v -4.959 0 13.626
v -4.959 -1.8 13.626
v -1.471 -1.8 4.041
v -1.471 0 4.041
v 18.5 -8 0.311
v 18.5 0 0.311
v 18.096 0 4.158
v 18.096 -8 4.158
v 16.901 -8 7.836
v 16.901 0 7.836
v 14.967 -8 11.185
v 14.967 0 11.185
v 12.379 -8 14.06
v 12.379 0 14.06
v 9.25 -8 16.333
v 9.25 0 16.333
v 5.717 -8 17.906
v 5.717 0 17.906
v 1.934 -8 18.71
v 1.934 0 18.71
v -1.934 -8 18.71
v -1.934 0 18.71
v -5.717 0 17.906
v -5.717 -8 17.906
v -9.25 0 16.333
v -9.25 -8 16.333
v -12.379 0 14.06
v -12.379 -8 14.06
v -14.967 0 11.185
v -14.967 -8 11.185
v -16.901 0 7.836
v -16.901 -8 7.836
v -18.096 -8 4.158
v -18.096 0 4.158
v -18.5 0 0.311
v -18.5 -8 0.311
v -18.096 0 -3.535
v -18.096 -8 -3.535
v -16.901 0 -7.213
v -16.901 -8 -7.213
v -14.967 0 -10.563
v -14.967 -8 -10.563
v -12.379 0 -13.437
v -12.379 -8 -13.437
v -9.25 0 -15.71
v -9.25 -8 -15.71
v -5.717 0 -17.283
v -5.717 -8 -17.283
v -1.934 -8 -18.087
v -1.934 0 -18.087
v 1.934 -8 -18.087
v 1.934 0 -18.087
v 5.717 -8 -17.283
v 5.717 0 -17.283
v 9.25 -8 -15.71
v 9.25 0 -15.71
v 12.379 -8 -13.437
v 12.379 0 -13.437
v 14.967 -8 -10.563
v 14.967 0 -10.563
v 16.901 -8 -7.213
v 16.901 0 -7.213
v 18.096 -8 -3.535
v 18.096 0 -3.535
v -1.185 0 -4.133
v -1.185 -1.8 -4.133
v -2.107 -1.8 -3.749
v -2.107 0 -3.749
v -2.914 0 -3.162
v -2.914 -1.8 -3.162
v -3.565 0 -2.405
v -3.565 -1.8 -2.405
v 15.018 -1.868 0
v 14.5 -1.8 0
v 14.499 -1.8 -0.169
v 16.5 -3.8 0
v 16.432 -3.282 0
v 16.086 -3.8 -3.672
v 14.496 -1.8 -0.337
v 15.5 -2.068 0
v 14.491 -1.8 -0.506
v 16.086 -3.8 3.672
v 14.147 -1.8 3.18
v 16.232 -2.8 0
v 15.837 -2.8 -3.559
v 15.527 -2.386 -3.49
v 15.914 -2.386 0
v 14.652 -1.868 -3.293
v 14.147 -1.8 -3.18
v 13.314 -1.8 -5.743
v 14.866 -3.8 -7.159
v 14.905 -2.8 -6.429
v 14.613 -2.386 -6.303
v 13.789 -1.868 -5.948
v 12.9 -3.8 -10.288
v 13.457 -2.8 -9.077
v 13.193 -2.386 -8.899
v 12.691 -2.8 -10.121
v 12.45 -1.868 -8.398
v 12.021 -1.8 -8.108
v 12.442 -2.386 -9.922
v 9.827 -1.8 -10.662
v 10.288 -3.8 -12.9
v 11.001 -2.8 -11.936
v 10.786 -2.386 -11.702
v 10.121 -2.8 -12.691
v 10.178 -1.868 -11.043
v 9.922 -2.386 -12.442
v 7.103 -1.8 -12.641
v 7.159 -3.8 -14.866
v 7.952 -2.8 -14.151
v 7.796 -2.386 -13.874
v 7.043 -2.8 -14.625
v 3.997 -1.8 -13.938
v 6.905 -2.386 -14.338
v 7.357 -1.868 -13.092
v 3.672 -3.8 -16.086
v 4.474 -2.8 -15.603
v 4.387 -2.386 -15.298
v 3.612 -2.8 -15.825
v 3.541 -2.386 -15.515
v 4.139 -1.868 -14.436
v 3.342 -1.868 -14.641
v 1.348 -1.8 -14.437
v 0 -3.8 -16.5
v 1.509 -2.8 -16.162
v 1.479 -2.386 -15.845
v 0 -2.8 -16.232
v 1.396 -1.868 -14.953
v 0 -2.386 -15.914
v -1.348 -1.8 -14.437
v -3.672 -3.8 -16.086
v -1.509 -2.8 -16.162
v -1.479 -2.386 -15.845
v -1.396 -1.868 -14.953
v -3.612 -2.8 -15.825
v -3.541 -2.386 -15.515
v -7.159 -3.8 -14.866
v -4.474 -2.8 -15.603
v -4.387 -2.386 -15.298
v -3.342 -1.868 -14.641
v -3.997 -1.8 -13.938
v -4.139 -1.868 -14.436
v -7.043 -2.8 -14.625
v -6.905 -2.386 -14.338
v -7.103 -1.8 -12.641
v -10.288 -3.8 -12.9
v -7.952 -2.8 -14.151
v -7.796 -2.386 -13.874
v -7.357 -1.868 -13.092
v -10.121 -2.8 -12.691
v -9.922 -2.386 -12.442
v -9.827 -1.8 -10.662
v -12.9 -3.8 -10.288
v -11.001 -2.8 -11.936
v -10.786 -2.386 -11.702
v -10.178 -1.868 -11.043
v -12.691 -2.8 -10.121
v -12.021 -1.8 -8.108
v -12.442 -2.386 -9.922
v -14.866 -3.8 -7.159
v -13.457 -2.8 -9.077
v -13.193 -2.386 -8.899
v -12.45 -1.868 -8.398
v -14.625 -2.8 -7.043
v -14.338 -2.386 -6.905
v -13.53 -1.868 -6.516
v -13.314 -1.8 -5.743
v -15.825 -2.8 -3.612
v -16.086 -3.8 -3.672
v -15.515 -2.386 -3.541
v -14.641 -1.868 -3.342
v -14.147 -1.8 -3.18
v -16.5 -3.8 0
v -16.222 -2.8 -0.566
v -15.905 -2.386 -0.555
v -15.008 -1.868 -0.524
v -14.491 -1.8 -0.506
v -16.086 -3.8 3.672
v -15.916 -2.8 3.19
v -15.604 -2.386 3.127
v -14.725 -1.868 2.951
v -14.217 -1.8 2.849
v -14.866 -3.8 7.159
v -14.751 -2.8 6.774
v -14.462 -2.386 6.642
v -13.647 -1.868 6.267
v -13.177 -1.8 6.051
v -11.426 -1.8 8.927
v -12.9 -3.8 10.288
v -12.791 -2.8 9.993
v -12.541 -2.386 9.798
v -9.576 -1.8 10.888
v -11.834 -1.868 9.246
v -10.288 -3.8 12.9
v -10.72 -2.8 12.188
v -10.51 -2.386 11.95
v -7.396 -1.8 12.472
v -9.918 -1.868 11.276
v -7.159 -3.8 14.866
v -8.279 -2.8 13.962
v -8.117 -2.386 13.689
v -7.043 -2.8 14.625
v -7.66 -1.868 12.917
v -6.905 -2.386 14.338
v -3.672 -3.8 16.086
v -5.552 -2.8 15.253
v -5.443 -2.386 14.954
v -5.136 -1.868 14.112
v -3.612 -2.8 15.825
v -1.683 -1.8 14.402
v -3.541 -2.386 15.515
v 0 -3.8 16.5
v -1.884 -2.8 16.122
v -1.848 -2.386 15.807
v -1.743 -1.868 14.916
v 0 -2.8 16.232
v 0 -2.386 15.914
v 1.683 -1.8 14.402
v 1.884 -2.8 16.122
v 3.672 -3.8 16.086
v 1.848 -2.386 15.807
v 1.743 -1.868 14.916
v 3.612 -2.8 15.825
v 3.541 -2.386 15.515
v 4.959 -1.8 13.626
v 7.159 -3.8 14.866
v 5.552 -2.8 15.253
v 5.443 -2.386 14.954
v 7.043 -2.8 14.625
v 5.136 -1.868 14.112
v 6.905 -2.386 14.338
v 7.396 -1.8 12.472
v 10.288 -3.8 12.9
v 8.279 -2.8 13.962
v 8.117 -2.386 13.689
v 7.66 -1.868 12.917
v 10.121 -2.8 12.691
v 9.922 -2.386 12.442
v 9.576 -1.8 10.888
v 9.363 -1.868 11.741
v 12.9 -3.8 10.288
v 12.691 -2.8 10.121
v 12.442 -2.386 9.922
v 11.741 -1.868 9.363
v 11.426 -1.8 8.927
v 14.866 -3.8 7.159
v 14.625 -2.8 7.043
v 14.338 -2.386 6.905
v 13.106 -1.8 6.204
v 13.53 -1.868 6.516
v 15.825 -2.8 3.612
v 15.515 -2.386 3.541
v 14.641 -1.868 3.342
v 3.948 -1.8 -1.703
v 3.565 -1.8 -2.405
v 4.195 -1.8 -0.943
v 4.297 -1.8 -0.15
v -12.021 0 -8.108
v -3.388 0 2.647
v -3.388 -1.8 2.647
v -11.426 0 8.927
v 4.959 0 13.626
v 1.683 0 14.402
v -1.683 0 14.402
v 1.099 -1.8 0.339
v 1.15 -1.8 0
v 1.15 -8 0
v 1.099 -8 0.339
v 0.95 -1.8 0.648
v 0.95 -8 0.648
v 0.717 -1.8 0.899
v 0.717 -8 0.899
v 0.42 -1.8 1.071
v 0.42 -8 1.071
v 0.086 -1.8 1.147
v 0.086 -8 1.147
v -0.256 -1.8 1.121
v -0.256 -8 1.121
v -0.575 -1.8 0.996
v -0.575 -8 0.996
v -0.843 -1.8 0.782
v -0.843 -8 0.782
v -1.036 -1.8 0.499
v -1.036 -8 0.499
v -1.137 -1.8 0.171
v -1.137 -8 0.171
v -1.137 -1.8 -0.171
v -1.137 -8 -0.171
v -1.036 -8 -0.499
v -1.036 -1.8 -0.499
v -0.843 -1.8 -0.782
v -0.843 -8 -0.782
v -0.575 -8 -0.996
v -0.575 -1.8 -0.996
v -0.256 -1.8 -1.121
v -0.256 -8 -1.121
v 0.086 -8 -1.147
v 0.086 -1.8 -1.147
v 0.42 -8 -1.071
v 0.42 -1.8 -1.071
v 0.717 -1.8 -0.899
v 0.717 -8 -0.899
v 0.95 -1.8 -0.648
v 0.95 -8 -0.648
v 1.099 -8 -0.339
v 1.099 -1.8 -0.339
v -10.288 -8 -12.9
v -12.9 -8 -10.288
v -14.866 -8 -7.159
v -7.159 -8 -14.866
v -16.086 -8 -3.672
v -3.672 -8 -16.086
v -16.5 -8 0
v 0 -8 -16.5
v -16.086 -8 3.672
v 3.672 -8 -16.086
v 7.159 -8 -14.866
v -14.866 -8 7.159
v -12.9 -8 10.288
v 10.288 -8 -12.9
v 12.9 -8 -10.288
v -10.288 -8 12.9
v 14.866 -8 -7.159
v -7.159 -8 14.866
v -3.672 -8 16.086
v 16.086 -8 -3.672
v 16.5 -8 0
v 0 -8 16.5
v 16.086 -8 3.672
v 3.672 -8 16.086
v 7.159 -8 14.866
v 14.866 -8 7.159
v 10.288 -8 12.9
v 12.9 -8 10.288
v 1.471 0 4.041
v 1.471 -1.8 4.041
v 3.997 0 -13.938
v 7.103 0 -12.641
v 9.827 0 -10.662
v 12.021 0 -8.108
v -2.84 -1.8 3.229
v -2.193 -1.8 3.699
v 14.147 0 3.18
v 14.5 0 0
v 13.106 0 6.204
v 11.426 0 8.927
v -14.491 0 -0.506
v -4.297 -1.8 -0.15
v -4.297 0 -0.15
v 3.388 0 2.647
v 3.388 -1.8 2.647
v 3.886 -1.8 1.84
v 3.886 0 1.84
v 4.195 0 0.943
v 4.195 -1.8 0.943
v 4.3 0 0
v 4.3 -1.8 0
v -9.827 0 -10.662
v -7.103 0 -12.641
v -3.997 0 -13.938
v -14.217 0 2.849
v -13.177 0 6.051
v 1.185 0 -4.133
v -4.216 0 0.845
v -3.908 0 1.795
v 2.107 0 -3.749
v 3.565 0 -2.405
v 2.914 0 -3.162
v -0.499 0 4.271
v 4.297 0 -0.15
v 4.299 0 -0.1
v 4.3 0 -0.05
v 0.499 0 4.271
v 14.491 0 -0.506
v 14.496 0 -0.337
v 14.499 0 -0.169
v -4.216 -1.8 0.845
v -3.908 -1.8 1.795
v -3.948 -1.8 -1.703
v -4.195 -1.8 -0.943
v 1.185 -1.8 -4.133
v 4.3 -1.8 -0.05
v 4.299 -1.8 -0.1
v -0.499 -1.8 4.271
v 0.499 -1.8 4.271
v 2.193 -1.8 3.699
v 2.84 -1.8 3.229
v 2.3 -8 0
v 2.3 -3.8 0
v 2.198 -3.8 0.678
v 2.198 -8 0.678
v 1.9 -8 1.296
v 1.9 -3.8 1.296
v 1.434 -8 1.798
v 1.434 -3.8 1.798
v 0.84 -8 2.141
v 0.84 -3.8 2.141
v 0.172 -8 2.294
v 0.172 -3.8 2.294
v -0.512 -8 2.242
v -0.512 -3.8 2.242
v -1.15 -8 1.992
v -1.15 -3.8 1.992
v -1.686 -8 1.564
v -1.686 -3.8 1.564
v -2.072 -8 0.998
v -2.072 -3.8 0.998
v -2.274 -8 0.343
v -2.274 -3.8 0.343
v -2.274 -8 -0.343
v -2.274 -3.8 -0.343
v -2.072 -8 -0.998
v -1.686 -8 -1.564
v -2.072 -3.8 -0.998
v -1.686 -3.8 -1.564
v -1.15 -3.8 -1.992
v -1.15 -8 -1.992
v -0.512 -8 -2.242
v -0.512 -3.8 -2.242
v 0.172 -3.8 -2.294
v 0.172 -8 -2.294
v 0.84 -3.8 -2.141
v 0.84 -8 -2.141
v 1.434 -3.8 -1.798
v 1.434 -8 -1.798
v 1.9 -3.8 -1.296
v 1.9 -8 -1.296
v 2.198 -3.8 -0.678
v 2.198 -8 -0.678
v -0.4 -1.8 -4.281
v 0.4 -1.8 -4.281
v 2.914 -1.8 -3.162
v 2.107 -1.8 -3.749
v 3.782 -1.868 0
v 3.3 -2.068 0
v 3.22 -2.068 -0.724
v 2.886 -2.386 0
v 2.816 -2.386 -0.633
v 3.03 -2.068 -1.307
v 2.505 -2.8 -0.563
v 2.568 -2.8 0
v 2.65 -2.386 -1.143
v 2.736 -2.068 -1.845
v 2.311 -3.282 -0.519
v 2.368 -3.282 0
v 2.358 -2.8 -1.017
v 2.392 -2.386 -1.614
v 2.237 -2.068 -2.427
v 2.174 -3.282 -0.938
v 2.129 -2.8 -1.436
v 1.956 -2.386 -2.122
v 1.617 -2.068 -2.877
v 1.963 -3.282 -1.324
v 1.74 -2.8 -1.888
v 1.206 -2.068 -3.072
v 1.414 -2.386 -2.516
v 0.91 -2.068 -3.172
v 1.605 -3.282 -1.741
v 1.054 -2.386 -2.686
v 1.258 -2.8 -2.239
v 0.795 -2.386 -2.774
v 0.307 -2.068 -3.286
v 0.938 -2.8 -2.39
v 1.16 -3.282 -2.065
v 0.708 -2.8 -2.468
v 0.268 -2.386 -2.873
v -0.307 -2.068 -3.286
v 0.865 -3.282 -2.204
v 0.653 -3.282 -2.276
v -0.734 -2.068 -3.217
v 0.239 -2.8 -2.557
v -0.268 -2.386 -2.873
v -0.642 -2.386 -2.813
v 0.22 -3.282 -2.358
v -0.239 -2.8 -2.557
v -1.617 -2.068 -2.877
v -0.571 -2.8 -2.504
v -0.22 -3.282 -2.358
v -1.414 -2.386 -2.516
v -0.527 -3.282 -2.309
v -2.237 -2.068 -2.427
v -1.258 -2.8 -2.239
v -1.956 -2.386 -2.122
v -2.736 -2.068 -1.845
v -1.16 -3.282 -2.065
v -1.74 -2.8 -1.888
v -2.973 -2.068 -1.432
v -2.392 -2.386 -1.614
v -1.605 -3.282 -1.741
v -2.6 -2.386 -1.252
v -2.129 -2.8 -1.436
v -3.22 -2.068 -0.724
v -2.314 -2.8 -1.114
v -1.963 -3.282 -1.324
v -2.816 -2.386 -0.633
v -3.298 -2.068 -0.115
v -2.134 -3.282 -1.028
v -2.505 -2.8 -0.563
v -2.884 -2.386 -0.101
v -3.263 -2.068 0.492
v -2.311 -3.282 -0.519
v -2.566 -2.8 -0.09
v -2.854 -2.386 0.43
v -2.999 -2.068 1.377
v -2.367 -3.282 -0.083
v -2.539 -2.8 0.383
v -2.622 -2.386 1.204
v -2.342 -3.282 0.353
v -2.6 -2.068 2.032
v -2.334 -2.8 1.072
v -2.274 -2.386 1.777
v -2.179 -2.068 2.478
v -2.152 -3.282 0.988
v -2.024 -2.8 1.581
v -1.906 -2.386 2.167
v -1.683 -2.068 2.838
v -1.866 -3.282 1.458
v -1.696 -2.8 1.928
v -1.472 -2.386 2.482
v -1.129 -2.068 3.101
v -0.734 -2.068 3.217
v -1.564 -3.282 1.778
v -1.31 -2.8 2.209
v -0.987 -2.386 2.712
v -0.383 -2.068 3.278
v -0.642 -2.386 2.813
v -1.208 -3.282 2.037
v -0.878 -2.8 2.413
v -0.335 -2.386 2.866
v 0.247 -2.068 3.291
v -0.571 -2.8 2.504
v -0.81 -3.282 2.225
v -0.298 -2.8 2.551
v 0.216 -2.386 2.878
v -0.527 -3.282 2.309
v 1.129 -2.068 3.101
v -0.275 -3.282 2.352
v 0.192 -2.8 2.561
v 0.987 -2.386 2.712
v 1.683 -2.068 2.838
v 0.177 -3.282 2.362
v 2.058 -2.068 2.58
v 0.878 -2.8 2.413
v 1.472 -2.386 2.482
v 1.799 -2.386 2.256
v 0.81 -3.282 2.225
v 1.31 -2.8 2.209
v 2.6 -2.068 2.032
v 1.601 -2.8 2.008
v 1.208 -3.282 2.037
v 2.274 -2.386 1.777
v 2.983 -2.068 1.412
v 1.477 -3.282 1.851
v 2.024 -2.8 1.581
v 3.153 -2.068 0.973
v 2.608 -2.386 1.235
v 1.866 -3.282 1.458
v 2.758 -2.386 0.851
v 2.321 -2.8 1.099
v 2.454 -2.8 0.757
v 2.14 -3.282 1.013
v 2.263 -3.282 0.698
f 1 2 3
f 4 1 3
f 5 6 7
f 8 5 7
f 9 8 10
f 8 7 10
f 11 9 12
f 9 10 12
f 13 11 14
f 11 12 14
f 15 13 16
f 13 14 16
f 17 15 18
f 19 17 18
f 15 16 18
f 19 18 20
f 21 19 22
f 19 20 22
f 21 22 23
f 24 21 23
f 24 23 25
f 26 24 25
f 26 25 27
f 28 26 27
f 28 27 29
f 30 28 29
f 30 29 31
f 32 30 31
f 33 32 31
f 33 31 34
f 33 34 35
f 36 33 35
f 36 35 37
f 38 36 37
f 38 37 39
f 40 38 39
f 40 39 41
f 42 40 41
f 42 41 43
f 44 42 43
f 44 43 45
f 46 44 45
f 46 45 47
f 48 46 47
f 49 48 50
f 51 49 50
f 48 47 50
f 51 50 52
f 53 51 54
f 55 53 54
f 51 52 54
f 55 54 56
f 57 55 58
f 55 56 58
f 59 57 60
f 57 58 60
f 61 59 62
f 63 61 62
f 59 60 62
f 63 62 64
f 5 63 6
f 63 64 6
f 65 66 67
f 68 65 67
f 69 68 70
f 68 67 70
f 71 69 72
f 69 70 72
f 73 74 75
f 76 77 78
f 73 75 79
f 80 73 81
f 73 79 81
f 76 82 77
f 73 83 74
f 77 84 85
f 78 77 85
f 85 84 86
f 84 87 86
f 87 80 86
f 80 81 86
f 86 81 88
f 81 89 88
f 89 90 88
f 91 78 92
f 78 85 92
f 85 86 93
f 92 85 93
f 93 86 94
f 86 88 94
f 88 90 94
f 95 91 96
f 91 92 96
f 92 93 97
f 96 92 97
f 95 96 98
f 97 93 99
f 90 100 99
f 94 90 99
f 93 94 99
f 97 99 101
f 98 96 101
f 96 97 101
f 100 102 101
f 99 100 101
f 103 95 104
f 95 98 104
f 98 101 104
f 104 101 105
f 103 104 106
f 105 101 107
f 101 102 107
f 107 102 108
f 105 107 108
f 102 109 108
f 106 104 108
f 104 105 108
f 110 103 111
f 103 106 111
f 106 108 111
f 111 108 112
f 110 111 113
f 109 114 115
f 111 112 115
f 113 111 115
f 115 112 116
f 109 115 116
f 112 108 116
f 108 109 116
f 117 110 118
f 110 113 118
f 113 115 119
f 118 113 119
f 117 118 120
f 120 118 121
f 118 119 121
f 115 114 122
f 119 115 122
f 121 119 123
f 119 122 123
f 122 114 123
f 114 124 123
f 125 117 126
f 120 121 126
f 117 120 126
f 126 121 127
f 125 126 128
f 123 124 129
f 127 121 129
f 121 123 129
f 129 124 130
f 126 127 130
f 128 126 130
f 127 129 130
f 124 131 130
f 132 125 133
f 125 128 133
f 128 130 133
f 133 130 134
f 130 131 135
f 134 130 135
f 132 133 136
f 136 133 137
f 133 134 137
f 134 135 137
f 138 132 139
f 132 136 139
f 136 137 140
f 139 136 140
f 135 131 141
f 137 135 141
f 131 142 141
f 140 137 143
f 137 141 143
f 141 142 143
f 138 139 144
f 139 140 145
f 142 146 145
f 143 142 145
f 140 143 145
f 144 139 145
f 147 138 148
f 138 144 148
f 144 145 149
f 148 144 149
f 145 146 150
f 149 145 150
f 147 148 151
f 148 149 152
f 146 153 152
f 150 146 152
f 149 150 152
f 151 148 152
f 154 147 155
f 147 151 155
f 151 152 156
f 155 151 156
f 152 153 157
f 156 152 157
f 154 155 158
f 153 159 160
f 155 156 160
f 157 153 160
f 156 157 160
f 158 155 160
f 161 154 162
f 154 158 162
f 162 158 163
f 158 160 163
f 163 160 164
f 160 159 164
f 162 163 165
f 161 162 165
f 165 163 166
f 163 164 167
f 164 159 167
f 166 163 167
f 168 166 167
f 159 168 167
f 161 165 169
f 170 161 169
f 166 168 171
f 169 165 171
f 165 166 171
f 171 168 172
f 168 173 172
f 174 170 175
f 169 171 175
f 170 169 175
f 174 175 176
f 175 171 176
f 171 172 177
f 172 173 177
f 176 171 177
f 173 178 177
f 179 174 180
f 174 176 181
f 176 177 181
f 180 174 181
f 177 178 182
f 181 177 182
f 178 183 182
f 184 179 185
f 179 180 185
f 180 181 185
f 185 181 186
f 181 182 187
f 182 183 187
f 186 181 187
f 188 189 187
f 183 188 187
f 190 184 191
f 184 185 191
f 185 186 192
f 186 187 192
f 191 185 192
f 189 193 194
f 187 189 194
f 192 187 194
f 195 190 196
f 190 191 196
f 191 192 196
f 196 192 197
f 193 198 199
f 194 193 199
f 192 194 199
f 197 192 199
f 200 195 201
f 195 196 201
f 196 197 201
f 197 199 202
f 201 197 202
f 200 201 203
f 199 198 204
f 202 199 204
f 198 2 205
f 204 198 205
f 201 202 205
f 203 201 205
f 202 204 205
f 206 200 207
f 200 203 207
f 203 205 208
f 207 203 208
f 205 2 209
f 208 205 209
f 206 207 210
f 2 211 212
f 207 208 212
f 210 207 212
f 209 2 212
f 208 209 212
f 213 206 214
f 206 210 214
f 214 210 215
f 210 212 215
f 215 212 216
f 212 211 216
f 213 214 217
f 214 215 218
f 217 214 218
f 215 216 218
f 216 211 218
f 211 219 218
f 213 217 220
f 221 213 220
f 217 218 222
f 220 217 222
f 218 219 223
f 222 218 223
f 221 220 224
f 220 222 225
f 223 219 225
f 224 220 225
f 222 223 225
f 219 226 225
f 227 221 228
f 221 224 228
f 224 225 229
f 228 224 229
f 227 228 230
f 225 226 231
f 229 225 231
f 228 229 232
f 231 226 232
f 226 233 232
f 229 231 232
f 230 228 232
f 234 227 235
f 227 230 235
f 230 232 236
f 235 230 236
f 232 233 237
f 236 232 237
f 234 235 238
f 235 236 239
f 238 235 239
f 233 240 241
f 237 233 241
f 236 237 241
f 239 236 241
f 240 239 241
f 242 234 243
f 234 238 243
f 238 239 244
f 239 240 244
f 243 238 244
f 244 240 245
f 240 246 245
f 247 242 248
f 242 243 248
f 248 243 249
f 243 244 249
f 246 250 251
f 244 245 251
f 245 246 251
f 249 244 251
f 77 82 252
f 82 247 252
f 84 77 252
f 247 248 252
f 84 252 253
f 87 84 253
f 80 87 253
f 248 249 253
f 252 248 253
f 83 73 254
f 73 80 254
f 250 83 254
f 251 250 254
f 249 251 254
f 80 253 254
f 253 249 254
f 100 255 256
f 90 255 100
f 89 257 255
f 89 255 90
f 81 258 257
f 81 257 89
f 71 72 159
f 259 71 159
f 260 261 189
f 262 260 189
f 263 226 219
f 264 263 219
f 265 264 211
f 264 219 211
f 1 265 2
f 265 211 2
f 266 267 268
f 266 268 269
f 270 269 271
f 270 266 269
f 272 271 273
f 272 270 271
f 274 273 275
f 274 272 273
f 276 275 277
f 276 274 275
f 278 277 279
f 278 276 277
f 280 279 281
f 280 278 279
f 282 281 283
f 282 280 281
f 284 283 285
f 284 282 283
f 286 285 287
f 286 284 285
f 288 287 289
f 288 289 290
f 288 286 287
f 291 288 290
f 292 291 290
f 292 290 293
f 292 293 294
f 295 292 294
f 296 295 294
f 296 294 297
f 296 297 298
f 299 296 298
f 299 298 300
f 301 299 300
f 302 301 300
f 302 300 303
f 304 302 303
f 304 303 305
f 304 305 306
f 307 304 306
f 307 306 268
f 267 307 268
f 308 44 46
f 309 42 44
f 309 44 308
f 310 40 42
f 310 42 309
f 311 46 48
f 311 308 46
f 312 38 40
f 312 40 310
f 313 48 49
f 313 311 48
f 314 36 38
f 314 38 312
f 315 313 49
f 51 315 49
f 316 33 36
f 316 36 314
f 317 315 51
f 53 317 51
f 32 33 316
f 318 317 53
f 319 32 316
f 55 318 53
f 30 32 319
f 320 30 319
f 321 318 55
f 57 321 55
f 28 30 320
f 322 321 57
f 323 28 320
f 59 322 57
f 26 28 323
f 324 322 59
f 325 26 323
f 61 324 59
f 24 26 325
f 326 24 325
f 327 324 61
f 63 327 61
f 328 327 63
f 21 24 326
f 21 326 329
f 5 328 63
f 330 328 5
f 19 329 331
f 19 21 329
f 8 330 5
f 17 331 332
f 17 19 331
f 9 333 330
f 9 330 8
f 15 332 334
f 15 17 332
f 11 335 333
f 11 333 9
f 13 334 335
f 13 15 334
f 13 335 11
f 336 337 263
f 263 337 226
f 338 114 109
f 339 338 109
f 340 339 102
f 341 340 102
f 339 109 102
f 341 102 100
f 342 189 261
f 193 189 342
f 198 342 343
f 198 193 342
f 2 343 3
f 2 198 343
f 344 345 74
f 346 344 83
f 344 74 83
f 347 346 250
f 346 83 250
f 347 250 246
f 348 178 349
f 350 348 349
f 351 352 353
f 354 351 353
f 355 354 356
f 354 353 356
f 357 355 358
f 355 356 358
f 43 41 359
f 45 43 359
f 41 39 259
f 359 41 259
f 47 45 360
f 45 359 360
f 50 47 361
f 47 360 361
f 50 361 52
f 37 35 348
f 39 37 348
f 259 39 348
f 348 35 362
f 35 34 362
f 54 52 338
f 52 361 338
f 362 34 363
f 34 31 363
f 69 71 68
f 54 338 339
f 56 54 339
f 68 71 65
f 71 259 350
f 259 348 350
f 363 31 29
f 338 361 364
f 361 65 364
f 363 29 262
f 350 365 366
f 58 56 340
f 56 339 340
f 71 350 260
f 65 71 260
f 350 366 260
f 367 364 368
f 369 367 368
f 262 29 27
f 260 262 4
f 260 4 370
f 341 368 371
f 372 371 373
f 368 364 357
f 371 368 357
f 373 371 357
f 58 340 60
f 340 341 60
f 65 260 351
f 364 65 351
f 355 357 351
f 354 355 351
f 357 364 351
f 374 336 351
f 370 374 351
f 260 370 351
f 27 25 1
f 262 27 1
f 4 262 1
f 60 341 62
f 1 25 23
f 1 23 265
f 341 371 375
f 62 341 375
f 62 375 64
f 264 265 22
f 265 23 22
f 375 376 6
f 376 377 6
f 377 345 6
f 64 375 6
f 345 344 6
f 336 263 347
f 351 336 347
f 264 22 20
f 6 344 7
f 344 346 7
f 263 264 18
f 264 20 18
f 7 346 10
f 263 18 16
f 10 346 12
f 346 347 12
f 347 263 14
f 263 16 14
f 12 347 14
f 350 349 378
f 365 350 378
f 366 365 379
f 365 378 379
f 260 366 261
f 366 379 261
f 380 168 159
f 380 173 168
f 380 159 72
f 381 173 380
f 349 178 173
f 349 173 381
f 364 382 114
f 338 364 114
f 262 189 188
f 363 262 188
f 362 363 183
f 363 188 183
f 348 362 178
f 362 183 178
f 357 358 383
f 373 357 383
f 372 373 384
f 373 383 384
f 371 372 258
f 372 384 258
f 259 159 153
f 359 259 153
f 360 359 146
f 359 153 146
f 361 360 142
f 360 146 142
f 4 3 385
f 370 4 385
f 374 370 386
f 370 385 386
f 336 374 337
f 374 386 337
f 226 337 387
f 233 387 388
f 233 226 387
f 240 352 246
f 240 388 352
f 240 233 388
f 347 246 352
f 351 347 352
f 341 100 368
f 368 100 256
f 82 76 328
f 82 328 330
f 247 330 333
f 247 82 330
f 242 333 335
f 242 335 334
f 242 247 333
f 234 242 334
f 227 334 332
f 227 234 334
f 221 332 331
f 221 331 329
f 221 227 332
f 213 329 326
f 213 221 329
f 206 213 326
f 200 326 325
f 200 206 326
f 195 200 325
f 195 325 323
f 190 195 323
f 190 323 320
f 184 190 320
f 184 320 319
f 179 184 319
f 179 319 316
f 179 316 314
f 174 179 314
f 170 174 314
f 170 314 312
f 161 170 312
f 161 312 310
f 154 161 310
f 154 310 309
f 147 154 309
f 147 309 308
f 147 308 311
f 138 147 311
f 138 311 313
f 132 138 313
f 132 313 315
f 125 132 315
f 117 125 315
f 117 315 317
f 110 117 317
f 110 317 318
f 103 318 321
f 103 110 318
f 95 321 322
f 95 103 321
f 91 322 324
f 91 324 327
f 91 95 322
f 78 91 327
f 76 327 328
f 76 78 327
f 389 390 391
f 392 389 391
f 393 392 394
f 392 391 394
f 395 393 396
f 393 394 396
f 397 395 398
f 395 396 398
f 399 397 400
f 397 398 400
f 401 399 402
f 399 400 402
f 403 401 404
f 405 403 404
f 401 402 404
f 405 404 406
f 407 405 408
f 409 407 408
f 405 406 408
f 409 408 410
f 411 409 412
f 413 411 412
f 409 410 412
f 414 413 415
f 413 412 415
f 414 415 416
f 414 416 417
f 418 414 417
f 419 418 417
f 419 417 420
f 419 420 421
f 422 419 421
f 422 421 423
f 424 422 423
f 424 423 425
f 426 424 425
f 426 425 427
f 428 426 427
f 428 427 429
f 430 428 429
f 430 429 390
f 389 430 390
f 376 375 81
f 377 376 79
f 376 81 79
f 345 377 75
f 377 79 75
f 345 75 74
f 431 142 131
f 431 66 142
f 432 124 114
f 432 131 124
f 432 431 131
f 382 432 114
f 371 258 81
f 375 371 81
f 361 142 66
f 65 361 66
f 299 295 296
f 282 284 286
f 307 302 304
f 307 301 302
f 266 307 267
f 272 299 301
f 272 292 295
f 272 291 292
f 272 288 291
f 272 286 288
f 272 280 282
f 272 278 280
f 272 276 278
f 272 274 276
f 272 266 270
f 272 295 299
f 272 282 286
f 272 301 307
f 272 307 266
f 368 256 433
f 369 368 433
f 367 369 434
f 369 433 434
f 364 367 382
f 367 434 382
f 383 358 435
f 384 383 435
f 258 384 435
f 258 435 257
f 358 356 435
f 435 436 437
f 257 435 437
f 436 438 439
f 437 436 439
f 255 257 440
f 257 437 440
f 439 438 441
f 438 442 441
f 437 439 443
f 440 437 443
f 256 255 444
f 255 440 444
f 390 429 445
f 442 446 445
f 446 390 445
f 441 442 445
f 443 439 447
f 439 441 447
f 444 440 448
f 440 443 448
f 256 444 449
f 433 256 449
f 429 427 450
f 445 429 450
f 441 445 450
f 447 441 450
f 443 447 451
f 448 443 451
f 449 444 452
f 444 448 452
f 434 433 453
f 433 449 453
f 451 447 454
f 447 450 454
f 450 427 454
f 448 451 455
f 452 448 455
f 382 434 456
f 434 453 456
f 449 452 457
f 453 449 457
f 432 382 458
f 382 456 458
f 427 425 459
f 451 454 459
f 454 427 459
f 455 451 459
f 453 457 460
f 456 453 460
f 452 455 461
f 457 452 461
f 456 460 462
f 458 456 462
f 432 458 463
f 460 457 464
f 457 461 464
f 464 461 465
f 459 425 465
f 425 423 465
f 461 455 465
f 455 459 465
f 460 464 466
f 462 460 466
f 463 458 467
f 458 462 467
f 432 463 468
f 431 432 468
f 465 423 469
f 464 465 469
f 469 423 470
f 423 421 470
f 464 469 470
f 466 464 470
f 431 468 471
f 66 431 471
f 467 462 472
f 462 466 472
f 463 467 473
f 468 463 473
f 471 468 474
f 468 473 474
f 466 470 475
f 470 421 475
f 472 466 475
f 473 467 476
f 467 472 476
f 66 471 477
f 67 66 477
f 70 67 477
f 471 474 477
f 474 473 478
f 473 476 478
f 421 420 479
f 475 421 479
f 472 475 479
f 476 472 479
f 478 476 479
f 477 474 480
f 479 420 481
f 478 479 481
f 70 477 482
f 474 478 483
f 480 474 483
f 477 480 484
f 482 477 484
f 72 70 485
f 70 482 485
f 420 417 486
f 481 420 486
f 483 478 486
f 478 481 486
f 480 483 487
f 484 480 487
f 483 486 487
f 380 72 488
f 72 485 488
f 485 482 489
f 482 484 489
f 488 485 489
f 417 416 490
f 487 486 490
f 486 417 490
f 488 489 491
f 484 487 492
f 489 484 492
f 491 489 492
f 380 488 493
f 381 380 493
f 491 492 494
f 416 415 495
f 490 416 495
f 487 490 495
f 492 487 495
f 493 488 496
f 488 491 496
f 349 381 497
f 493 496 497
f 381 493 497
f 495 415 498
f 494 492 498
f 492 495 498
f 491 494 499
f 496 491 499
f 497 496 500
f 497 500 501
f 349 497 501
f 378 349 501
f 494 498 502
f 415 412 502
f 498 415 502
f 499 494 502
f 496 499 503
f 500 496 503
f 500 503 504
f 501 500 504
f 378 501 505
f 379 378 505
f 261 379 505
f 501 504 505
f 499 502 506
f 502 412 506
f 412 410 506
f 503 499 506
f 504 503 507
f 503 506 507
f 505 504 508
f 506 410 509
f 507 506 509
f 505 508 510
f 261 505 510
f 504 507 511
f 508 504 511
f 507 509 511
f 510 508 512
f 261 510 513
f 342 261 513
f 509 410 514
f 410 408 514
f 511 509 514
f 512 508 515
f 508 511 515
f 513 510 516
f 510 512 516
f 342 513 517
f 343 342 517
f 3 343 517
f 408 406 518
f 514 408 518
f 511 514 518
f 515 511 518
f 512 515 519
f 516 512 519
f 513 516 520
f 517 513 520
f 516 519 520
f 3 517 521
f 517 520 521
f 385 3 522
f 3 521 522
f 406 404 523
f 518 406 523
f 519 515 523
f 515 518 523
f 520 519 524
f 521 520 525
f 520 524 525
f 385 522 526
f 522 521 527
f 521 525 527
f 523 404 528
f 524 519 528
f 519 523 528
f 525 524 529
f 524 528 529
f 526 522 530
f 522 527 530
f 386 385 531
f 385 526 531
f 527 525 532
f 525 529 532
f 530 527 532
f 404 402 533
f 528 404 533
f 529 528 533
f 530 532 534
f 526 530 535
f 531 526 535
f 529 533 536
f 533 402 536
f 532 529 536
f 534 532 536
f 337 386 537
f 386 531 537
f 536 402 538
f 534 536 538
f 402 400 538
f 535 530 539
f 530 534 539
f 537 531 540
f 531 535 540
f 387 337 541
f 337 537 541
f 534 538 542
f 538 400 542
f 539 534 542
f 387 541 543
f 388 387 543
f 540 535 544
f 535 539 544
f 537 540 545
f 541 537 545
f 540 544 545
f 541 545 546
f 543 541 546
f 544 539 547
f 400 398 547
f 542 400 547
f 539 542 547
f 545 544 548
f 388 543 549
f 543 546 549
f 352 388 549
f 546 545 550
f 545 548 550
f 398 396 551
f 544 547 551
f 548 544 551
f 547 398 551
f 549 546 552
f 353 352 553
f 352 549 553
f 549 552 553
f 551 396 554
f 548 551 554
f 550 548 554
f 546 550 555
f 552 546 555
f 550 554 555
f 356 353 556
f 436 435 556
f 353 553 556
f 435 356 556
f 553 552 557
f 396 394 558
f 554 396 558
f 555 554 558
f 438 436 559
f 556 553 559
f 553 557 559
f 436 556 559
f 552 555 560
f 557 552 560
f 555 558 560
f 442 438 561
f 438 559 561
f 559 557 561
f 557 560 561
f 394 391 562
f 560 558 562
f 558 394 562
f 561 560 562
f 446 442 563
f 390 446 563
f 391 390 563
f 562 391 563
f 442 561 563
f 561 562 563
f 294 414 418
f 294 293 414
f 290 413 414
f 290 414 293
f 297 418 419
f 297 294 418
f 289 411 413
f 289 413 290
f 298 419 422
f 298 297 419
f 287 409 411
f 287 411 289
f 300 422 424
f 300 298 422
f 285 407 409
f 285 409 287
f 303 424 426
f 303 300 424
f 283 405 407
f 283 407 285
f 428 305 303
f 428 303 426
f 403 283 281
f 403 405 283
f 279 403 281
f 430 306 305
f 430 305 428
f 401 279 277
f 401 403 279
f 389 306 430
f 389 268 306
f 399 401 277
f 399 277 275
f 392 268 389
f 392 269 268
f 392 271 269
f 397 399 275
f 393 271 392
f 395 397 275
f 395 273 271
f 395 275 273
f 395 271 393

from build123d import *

# Parameters (mm, degrees)
F0_R     = 2.3
F0_R_2   = 1.15
F1_DEPTH = 8
F0_R_3   = 18.5
F0_R_4   = 16.5
F2_DEPTH = 8
F3_DEPTH = 1.8
F4_R     = 2
F6_DEPTH = 1.801


with BuildPart() as f1:
    # F0 (on Front) → F1 (new body)
    with BuildSketch(Plane.XZ):
        Circle(F0_R)
        Circle(F0_R_2, mode=Mode.SUBTRACT)
    extrude(amount=F1_DEPTH)



with BuildPart() as f2:
    # F0 (on Front) → F2 (new body)
    with BuildSketch(Plane.XZ):
        with Locations((0, 0.311320764)):
            Circle(F0_R_3)
        Circle(F0_R_4, mode=Mode.SUBTRACT)
    extrude(amount=F2_DEPTH)


with BuildPart() as f1_1:
    add(f1.part)

    add(f2.part)  # F3 merges F2
    # F0 (on Front) → F3 (join)
    with BuildSketch(Plane.XZ):
        with Locations((0, 0.311320764)):
            Circle(F0_R_3)
        Circle(F0_R_4, mode=Mode.SUBTRACT)
        Circle(F0_R_4)
        Circle(F0_R, mode=Mode.SUBTRACT)
        Circle(F0_R)
        Circle(F0_R_2, mode=Mode.SUBTRACT)
        Circle(F0_R_2)
    extrude(amount=F3_DEPTH)

    # F4
    f4_edges = [f1_1.edges().sort_by_distance(p)[0] for p in [
        (-16.5, -1.8, 0),
        (-2.3, -1.8, 0),
    ]]
    fillet(f4_edges, radius=F4_R)

    # F5 (on face) → F6 (cut, through all)
    with BuildSketch(Plane.XZ.offset(1.8)):
        with BuildLine():
            Line((1.4706866163, 4.0406782694), (4.9592920782, 13.6255430014))
            ThreePointArc((4.9592920782, 13.6255430014), (0, 14.5), (-4.9592920782, 13.6255430014))
            Line((-4.9592920782, 13.6255430014), (-1.4706866163, 4.0406782694))
            ThreePointArc((-1.4706866163, 4.0406782694), (0, 4.3), (1.4706866163, 4.0406782694))
        make_face()
        with BuildLine():
            ThreePointArc((14.4911669918, -0.5060427022), (14.4977915798, -0.2530598933), (14.5, 0))
            ThreePointArc((14.5, 0), (13.7100193462, 4.7207382396), (11.4261559273, 8.9270913922))
            Line((11.4261559273, 8.9270913922), (3.3884462405, 2.6473443439))
            ThreePointArc((3.3884462405, 2.6473443439), (4.0657298751, 1.3999430642), (4.3, 0))
            ThreePointArc((4.3, 0), (4.2993450892, -0.0750453477), (4.2973805562, -0.1500678358))
            Line((4.2973805562, -0.1500678358), (14.4911669918, -0.5060427022))
        make_face()
        with BuildLine():
            ThreePointArc((3.9967416593, -13.9382945911), (8.5228861582, -11.7307464184), (12.021044802, -8.1082971003))
            Line((12.021044802, -8.1082971003), (3.564861562, -2.4045294849))
            ThreePointArc((3.564861562, -2.4045294849), (2.5274765849, -3.4787730758), (1.18524063, -4.1334252925))
            Line((1.18524063, -4.1334252925), (3.9967416593, -13.9382945911))
        make_face()
        with BuildLine():
            ThreePointArc((-12.021044802, -8.1082971003), (-8.5228861582, -11.7307464184), (-3.9967416593, -13.9382945911))
            Line((-3.9967416593, -13.9382945911), (-1.18524063, -4.1334252925))
            ThreePointArc((-1.18524063, -4.1334252925), (-2.5274765849, -3.4787730758), (-3.564861562, -2.4045294849))
            Line((-3.564861562, -2.4045294849), (-12.021044802, -8.1082971003))
        make_face()
        with BuildLine():
            Line((-3.3884462405, 2.6473443439), (-11.4261559273, 8.9270913922))
            ThreePointArc((-11.4261559273, 8.9270913922), (-13.7903194863, 4.4807464184), (-14.4911669918, -0.5060427022))
            Line((-14.4911669918, -0.5060427022), (-4.2973805562, -0.1500678358))
            ThreePointArc((-4.2973805562, -0.1500678358), (-4.0895430201, 1.3287730758), (-3.3884462405, 2.6473443439))
        make_face()
    extrude(amount=-F6_DEPTH, mode=Mode.SUBTRACT)


solid = f1_1.part
